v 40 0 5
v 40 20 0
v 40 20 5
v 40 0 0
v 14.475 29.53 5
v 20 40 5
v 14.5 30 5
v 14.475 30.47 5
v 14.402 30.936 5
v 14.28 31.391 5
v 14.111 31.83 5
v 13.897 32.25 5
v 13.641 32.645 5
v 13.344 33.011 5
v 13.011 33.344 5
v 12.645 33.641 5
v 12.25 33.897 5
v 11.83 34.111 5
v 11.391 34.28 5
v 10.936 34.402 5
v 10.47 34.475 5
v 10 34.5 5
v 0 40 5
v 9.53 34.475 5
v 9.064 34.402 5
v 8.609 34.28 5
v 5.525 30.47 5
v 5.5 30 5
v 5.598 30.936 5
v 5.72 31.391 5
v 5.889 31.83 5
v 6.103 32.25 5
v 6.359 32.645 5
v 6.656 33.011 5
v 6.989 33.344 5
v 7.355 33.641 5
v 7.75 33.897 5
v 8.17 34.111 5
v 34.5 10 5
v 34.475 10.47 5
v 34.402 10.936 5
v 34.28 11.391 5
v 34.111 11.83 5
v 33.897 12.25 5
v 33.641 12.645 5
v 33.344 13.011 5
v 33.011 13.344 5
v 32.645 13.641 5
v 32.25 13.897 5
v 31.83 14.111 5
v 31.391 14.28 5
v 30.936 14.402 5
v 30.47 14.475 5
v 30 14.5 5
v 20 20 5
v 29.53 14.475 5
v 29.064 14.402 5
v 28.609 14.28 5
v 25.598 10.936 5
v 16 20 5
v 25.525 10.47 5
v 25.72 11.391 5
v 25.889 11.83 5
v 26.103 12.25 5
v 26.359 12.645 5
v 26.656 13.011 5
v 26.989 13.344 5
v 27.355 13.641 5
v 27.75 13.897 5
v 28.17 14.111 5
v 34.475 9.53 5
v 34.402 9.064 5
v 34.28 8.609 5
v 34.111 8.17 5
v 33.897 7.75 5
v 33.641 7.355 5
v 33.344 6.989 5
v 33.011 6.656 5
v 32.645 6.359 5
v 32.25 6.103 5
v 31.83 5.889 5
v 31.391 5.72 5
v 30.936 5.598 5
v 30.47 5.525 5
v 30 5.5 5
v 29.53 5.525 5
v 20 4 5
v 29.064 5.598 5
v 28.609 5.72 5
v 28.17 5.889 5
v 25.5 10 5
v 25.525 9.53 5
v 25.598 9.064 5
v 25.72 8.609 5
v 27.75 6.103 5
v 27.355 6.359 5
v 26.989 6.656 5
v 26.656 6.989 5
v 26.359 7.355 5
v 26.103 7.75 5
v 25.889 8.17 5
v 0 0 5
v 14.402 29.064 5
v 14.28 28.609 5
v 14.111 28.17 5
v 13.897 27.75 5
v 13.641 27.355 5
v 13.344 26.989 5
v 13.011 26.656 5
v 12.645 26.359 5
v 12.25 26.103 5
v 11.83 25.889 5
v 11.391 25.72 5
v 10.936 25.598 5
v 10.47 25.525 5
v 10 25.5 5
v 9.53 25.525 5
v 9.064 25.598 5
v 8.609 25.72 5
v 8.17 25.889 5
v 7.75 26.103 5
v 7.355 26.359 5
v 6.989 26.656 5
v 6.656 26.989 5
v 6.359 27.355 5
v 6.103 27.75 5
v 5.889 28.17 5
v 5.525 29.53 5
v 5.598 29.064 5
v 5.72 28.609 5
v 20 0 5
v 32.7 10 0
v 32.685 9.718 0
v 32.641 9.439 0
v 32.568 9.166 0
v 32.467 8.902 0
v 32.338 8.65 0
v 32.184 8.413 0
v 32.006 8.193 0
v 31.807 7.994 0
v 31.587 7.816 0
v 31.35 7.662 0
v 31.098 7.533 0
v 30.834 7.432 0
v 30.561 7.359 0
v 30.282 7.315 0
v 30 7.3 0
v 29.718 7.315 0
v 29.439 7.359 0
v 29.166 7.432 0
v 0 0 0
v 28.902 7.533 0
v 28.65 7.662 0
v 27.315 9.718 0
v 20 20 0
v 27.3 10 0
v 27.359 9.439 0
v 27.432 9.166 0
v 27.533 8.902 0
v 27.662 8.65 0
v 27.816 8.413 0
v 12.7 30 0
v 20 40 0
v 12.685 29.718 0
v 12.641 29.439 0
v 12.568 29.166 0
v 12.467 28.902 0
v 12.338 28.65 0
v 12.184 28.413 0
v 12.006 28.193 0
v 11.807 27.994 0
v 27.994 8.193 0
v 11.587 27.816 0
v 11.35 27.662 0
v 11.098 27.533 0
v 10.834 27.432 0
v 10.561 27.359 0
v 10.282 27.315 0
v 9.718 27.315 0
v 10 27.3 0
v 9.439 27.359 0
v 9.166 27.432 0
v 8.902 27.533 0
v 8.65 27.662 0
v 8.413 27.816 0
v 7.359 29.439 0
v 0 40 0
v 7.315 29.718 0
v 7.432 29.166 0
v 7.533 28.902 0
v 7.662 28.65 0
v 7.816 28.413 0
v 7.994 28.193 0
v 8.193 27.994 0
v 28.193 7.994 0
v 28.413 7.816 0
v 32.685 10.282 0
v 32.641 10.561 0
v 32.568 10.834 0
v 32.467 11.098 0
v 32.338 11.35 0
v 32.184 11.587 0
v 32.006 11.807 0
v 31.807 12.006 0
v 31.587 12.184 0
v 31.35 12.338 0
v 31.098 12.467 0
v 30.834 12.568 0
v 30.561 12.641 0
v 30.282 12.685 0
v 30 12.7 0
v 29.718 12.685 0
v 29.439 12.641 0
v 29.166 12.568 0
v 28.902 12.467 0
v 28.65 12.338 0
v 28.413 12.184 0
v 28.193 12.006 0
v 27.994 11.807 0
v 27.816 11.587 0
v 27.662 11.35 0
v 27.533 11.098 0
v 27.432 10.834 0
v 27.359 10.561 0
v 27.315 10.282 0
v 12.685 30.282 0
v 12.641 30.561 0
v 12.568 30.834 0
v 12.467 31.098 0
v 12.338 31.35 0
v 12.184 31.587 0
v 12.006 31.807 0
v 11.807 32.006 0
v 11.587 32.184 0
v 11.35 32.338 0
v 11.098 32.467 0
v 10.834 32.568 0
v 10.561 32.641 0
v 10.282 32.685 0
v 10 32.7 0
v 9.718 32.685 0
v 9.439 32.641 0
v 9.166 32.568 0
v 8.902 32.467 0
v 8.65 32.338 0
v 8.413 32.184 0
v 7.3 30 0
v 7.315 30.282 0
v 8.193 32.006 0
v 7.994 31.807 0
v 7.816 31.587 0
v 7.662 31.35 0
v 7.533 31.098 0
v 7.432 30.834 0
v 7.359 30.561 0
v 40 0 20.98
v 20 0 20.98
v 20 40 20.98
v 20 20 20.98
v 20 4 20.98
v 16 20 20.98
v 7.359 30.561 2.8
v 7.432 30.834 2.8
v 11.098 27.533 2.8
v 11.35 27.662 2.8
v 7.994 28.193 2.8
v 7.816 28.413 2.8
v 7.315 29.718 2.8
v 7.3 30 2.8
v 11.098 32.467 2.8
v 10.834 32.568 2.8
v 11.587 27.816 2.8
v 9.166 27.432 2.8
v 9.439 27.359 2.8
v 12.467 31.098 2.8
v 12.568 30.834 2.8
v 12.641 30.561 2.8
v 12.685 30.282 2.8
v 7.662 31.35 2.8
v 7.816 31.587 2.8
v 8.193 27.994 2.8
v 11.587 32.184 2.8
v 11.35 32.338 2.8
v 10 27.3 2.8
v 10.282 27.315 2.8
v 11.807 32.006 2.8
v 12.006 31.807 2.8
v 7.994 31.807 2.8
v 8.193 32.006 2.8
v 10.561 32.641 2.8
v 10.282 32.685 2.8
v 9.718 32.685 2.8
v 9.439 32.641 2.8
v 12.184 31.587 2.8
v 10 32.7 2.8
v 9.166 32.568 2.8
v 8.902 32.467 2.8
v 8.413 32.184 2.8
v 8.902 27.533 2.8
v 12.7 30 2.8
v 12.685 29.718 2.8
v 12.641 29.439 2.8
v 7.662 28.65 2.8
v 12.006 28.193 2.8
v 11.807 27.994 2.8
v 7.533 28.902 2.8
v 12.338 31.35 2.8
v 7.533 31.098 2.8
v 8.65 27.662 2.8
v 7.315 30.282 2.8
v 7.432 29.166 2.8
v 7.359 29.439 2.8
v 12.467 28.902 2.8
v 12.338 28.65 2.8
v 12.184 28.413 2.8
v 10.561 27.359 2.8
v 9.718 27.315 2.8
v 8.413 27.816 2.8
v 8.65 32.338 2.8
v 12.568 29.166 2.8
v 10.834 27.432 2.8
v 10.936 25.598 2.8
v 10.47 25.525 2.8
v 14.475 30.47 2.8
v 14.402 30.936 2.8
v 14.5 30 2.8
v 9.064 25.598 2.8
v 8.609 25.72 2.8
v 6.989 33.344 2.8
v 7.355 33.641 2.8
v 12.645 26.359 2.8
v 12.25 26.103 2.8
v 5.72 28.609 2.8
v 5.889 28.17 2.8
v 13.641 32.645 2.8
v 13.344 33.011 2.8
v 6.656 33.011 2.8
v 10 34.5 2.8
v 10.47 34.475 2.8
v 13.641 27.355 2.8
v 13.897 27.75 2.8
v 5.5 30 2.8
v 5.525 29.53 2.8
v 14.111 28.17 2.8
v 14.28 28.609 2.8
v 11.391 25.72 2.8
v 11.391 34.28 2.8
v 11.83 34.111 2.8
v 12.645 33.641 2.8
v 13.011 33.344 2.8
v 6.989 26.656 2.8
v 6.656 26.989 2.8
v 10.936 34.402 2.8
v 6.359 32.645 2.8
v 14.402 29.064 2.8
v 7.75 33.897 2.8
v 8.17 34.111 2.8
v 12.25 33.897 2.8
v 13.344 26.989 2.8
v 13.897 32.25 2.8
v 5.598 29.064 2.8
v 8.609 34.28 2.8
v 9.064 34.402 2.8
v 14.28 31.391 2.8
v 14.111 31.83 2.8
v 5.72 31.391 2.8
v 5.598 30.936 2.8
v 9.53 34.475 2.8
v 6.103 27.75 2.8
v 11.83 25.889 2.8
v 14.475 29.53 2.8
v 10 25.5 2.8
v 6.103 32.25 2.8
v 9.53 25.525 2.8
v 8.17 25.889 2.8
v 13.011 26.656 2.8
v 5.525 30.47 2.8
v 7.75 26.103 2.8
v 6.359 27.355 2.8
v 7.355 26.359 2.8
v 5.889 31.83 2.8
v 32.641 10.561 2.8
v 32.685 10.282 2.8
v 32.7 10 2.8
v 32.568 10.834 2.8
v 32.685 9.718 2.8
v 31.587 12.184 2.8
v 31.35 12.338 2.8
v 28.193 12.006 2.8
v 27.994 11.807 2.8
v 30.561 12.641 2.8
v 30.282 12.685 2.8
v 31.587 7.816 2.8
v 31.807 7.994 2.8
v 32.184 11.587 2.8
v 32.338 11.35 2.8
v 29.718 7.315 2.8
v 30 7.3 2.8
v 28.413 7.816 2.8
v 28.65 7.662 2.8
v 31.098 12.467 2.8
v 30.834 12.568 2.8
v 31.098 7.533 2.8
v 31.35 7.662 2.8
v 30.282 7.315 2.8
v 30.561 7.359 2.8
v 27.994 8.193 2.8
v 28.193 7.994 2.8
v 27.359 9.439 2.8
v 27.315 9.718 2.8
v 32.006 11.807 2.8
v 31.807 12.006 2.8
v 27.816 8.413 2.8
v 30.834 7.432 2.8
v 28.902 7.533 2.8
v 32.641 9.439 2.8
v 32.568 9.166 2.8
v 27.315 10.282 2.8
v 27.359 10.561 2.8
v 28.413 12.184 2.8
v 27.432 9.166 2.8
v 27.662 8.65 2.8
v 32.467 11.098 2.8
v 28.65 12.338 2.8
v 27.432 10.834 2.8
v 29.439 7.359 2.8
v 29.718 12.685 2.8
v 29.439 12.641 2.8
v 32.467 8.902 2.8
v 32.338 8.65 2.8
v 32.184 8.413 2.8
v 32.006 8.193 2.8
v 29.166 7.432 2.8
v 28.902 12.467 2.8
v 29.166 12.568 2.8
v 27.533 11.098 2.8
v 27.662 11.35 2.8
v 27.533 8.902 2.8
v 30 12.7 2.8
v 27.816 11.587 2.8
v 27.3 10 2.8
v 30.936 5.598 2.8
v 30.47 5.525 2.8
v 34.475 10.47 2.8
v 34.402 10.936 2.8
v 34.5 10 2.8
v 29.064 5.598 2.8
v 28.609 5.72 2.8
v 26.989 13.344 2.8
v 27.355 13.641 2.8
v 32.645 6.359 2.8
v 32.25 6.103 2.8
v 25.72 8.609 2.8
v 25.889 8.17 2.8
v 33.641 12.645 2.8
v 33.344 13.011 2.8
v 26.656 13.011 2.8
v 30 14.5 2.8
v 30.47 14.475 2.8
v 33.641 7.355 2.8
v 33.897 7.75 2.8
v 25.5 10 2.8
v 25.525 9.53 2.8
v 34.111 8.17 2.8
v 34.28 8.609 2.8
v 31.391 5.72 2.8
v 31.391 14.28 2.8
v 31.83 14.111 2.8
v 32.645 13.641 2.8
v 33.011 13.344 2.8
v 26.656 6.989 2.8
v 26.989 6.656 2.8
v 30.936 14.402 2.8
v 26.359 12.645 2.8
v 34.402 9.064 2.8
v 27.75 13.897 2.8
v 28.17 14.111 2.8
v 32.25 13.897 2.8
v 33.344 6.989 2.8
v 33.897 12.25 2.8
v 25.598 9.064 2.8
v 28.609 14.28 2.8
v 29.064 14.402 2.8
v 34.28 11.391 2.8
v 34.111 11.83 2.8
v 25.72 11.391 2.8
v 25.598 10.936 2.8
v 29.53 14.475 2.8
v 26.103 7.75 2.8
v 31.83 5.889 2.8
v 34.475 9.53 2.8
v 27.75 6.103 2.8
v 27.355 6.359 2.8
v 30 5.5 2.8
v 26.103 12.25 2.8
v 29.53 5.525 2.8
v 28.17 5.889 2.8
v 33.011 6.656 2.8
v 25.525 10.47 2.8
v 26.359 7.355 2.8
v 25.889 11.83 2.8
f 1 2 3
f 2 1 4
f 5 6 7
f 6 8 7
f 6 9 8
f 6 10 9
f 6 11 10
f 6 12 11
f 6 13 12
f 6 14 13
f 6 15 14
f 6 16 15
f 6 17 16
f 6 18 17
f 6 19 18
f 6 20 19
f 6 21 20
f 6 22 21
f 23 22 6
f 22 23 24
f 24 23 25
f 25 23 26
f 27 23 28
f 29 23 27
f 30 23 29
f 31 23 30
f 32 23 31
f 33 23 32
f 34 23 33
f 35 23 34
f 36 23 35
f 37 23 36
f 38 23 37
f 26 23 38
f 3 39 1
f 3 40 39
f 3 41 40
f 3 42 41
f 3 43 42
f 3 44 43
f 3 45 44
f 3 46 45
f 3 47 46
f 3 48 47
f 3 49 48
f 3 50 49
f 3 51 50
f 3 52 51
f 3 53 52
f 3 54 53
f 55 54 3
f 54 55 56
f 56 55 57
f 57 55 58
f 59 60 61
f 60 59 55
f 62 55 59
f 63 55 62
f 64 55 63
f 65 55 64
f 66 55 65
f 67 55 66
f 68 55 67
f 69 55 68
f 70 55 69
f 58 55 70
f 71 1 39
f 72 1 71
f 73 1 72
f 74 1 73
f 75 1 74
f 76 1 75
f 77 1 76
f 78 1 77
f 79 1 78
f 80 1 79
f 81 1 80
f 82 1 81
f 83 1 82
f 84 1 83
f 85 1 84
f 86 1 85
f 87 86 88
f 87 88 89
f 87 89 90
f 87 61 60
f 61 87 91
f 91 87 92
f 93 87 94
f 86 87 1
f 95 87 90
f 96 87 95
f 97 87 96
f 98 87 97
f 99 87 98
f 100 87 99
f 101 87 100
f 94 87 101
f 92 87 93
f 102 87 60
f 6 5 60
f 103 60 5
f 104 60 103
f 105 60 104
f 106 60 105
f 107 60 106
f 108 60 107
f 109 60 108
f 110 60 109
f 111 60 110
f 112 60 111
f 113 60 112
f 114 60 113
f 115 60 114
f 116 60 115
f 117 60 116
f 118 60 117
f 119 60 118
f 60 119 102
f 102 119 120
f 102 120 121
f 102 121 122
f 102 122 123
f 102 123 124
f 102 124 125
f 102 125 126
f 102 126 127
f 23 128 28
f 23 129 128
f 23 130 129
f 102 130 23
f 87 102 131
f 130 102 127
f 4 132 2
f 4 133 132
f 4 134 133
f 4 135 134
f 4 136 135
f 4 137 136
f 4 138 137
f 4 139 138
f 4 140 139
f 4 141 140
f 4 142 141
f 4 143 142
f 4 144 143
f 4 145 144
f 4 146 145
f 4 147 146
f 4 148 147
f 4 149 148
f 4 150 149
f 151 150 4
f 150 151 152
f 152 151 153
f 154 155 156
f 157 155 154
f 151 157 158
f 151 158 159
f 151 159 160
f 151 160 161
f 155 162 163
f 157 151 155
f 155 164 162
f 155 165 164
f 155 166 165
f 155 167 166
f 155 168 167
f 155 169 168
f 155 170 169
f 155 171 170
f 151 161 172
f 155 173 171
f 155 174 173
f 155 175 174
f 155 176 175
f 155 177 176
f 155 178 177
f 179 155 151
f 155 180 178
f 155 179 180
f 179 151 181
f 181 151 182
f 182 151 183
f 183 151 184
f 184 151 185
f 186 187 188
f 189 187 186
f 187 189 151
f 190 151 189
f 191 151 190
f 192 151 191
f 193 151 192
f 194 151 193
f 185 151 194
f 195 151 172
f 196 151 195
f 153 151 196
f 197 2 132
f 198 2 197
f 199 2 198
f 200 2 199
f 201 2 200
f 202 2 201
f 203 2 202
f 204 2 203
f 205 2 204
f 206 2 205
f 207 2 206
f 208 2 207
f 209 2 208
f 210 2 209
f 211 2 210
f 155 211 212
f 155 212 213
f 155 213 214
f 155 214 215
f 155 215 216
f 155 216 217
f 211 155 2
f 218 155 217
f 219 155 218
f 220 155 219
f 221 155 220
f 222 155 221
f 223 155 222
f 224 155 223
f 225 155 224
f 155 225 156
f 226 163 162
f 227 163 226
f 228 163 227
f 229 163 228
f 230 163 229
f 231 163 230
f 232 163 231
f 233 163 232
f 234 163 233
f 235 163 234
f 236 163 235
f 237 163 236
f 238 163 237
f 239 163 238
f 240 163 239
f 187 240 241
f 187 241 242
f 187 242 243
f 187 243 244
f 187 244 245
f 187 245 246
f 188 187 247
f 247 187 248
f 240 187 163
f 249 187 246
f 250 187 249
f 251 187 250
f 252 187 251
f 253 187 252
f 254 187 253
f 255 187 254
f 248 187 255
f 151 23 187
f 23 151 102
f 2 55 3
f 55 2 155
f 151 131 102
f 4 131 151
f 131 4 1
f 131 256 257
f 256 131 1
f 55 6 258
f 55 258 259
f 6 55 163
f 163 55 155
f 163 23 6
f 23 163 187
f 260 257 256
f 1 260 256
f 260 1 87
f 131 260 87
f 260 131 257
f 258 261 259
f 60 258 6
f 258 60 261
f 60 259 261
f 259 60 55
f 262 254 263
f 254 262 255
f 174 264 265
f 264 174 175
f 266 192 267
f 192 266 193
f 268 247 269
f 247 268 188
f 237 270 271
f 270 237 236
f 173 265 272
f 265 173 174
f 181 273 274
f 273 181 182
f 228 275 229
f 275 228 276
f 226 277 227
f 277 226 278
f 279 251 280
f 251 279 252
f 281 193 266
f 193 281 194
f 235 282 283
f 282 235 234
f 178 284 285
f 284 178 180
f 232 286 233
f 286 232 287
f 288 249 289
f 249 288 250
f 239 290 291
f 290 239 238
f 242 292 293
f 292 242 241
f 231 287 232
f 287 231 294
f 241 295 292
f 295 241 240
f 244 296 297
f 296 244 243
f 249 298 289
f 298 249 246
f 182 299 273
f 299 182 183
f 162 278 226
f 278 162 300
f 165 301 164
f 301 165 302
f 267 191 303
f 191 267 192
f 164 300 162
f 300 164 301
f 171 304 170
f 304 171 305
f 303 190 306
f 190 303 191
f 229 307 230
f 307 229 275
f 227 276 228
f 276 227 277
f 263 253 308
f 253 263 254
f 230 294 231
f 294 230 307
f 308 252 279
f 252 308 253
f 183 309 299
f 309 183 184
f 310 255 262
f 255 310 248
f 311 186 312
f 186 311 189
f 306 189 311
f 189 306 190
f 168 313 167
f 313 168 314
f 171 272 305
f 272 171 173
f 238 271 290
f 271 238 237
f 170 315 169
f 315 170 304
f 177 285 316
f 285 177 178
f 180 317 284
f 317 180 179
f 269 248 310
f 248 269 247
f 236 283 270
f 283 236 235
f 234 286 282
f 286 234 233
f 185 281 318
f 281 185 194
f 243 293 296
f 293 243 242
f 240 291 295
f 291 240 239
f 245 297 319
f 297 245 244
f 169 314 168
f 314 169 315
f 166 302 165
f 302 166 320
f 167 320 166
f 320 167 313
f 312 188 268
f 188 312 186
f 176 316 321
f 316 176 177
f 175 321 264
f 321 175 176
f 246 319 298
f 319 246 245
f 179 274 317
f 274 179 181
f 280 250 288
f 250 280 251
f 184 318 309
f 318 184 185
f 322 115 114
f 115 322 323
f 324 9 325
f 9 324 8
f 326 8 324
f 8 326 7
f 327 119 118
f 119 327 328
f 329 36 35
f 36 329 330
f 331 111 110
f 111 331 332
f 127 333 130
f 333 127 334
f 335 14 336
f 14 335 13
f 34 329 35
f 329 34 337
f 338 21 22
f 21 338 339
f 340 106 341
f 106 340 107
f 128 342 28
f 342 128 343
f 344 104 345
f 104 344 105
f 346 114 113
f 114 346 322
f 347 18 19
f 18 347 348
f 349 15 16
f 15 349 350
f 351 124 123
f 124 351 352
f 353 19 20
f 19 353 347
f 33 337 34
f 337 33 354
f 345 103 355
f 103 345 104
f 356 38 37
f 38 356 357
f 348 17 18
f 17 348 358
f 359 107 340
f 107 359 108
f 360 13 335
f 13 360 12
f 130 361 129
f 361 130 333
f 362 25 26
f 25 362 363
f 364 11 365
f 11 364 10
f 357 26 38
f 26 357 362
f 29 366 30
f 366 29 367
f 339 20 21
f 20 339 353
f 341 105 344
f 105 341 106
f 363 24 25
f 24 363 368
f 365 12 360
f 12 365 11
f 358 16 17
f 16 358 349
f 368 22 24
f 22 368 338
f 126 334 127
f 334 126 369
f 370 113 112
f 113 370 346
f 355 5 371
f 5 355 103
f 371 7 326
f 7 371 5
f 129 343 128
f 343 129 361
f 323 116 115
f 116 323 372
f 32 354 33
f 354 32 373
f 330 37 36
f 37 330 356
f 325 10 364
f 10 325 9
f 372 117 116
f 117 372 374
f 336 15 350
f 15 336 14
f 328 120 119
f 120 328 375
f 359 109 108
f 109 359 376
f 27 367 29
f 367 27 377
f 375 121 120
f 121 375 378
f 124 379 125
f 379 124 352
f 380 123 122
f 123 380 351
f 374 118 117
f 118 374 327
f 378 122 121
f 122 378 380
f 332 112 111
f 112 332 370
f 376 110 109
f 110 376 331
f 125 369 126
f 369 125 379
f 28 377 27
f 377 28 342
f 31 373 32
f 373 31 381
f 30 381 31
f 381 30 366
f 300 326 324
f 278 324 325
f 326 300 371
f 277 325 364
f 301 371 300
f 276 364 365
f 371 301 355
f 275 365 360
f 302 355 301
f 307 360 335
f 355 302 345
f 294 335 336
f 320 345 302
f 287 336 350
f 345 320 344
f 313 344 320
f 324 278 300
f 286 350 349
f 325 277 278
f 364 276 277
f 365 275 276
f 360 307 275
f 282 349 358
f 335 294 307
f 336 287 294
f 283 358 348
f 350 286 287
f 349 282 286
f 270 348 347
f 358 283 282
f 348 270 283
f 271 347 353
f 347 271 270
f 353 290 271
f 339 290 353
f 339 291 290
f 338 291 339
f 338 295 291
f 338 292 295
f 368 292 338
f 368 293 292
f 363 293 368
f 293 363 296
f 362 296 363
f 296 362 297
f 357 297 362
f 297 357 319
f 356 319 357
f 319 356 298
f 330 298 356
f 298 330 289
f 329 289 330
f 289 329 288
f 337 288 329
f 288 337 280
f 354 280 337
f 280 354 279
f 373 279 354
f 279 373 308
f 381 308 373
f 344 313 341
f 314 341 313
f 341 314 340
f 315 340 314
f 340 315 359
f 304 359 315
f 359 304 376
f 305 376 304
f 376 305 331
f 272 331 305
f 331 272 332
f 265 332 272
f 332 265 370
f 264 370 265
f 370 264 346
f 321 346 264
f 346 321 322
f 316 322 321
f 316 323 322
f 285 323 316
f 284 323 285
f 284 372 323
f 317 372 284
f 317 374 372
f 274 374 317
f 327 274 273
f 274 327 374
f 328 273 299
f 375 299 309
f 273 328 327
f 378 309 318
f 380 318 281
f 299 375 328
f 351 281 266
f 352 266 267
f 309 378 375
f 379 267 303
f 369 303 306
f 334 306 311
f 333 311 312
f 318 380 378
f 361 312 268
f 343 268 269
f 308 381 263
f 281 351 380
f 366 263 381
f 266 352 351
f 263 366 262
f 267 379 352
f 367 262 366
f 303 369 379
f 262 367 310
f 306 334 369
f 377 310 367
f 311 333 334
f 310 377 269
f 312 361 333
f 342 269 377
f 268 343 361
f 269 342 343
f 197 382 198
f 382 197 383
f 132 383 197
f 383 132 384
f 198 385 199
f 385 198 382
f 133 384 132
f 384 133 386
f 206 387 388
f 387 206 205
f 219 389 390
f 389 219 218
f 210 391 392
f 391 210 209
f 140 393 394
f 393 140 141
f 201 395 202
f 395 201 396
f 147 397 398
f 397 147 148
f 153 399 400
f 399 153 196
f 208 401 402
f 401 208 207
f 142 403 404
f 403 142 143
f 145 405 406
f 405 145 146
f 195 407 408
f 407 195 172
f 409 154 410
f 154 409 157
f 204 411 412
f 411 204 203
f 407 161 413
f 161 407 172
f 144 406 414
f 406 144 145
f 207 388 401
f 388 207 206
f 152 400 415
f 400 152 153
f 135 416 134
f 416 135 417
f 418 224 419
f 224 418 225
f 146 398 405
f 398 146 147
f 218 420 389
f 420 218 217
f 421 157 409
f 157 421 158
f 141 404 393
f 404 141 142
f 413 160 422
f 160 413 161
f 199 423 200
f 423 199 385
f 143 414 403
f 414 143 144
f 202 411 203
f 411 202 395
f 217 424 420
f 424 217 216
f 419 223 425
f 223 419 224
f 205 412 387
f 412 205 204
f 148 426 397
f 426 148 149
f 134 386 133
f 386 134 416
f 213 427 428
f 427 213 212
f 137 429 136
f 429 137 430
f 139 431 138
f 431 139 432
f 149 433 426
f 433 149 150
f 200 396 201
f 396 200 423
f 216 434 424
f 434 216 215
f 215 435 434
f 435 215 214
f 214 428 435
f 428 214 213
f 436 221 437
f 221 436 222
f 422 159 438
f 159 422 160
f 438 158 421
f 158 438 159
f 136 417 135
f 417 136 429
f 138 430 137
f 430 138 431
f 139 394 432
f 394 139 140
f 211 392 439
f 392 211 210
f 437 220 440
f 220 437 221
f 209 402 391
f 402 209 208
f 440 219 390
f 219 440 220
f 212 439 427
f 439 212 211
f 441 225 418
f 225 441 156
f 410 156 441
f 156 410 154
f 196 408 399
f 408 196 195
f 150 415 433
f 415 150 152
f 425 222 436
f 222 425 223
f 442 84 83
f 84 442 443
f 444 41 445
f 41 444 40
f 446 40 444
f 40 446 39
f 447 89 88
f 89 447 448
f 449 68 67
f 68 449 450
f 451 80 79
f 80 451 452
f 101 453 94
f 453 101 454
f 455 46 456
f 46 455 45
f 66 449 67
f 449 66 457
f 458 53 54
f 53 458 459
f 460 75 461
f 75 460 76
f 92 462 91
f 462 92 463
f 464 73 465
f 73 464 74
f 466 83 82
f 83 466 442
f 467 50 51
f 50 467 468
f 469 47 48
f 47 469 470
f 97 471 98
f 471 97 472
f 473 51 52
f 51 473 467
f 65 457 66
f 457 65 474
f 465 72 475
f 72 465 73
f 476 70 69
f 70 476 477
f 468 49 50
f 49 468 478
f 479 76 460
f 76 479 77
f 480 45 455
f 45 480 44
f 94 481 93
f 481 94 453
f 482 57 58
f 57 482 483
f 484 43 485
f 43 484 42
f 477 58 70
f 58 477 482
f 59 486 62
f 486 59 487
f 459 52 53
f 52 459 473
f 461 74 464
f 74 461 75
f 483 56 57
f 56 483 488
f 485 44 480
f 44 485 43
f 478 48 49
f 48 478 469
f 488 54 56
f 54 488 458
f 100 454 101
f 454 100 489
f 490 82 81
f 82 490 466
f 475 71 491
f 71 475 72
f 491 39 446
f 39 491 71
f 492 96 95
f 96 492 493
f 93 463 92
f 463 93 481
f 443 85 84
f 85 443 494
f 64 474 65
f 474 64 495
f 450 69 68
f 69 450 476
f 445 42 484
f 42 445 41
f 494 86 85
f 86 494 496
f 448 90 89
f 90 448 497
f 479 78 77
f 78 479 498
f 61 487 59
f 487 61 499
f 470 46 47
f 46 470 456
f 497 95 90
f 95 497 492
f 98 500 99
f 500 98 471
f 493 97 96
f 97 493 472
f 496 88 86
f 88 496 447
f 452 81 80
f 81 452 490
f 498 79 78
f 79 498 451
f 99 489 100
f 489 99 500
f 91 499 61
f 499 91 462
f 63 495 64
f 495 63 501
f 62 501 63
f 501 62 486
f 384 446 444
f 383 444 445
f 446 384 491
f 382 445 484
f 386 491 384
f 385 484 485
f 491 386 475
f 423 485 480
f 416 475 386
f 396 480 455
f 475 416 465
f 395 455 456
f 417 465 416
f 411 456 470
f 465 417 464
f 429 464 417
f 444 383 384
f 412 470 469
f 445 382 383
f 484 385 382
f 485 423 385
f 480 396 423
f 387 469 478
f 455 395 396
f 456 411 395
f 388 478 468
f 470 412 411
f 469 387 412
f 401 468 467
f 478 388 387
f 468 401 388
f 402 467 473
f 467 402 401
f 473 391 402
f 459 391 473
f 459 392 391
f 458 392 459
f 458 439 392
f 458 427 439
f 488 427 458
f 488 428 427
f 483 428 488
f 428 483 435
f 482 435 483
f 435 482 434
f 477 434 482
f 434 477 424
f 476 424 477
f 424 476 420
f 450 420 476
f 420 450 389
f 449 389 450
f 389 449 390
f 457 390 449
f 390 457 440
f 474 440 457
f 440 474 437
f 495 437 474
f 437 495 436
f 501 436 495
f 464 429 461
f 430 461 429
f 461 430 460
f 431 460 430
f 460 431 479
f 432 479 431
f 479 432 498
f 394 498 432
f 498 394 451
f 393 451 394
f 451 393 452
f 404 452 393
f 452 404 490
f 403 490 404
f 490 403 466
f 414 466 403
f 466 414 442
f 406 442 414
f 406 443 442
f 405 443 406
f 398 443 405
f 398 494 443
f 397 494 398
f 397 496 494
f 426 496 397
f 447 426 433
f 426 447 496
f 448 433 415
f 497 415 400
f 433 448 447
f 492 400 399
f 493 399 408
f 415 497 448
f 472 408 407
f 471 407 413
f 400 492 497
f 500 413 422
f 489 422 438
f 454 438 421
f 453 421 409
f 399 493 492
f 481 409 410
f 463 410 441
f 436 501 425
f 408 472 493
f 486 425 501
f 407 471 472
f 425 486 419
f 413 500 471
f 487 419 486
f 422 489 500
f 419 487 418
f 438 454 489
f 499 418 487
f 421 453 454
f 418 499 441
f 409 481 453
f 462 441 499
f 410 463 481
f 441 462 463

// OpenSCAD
// 2020 corner bracket 40 mm
// 2020 aluminium-profile corner with ribs that overlap the L legs by eps.
$fn = 60;
eps = 0.02;
profile = 20;
arm = 40;
plate_t = 5;
rib_t = 4;
rib_h = 16;
hole_d = 5.4;
counterbore_d = 9;
counterbore_h = 2.2;

module rib_x() {
    translate([profile, 0, plate_t - eps])
        linear_extrude(height = rib_h)
            polygon(points = [[0, 0], [arm - profile, 0], [0, rib_t]]);
}

module rib_y() {
    translate([profile, profile, plate_t - eps])
        rotate([0, 0, 90])
            linear_extrude(height = rib_h)
                polygon(points = [[0, 0], [arm - profile, 0], [0, rib_t]]);
}

difference() {
    union() {
        cube([arm, profile, plate_t]);
        cube([profile, arm, plate_t]);
        rib_x();
        rib_y();
    }
    for (p = [[profile / 2, arm - profile / 2], [arm - profile / 2, profile / 2]]) {
        translate([p[0], p[1], -eps]) cylinder(d = hole_d, h = plate_t + 2 * eps);
        translate([p[0], p[1], plate_t - counterbore_h])
            cylinder(d = counterbore_d, h = counterbore_h + eps);
    }
}
